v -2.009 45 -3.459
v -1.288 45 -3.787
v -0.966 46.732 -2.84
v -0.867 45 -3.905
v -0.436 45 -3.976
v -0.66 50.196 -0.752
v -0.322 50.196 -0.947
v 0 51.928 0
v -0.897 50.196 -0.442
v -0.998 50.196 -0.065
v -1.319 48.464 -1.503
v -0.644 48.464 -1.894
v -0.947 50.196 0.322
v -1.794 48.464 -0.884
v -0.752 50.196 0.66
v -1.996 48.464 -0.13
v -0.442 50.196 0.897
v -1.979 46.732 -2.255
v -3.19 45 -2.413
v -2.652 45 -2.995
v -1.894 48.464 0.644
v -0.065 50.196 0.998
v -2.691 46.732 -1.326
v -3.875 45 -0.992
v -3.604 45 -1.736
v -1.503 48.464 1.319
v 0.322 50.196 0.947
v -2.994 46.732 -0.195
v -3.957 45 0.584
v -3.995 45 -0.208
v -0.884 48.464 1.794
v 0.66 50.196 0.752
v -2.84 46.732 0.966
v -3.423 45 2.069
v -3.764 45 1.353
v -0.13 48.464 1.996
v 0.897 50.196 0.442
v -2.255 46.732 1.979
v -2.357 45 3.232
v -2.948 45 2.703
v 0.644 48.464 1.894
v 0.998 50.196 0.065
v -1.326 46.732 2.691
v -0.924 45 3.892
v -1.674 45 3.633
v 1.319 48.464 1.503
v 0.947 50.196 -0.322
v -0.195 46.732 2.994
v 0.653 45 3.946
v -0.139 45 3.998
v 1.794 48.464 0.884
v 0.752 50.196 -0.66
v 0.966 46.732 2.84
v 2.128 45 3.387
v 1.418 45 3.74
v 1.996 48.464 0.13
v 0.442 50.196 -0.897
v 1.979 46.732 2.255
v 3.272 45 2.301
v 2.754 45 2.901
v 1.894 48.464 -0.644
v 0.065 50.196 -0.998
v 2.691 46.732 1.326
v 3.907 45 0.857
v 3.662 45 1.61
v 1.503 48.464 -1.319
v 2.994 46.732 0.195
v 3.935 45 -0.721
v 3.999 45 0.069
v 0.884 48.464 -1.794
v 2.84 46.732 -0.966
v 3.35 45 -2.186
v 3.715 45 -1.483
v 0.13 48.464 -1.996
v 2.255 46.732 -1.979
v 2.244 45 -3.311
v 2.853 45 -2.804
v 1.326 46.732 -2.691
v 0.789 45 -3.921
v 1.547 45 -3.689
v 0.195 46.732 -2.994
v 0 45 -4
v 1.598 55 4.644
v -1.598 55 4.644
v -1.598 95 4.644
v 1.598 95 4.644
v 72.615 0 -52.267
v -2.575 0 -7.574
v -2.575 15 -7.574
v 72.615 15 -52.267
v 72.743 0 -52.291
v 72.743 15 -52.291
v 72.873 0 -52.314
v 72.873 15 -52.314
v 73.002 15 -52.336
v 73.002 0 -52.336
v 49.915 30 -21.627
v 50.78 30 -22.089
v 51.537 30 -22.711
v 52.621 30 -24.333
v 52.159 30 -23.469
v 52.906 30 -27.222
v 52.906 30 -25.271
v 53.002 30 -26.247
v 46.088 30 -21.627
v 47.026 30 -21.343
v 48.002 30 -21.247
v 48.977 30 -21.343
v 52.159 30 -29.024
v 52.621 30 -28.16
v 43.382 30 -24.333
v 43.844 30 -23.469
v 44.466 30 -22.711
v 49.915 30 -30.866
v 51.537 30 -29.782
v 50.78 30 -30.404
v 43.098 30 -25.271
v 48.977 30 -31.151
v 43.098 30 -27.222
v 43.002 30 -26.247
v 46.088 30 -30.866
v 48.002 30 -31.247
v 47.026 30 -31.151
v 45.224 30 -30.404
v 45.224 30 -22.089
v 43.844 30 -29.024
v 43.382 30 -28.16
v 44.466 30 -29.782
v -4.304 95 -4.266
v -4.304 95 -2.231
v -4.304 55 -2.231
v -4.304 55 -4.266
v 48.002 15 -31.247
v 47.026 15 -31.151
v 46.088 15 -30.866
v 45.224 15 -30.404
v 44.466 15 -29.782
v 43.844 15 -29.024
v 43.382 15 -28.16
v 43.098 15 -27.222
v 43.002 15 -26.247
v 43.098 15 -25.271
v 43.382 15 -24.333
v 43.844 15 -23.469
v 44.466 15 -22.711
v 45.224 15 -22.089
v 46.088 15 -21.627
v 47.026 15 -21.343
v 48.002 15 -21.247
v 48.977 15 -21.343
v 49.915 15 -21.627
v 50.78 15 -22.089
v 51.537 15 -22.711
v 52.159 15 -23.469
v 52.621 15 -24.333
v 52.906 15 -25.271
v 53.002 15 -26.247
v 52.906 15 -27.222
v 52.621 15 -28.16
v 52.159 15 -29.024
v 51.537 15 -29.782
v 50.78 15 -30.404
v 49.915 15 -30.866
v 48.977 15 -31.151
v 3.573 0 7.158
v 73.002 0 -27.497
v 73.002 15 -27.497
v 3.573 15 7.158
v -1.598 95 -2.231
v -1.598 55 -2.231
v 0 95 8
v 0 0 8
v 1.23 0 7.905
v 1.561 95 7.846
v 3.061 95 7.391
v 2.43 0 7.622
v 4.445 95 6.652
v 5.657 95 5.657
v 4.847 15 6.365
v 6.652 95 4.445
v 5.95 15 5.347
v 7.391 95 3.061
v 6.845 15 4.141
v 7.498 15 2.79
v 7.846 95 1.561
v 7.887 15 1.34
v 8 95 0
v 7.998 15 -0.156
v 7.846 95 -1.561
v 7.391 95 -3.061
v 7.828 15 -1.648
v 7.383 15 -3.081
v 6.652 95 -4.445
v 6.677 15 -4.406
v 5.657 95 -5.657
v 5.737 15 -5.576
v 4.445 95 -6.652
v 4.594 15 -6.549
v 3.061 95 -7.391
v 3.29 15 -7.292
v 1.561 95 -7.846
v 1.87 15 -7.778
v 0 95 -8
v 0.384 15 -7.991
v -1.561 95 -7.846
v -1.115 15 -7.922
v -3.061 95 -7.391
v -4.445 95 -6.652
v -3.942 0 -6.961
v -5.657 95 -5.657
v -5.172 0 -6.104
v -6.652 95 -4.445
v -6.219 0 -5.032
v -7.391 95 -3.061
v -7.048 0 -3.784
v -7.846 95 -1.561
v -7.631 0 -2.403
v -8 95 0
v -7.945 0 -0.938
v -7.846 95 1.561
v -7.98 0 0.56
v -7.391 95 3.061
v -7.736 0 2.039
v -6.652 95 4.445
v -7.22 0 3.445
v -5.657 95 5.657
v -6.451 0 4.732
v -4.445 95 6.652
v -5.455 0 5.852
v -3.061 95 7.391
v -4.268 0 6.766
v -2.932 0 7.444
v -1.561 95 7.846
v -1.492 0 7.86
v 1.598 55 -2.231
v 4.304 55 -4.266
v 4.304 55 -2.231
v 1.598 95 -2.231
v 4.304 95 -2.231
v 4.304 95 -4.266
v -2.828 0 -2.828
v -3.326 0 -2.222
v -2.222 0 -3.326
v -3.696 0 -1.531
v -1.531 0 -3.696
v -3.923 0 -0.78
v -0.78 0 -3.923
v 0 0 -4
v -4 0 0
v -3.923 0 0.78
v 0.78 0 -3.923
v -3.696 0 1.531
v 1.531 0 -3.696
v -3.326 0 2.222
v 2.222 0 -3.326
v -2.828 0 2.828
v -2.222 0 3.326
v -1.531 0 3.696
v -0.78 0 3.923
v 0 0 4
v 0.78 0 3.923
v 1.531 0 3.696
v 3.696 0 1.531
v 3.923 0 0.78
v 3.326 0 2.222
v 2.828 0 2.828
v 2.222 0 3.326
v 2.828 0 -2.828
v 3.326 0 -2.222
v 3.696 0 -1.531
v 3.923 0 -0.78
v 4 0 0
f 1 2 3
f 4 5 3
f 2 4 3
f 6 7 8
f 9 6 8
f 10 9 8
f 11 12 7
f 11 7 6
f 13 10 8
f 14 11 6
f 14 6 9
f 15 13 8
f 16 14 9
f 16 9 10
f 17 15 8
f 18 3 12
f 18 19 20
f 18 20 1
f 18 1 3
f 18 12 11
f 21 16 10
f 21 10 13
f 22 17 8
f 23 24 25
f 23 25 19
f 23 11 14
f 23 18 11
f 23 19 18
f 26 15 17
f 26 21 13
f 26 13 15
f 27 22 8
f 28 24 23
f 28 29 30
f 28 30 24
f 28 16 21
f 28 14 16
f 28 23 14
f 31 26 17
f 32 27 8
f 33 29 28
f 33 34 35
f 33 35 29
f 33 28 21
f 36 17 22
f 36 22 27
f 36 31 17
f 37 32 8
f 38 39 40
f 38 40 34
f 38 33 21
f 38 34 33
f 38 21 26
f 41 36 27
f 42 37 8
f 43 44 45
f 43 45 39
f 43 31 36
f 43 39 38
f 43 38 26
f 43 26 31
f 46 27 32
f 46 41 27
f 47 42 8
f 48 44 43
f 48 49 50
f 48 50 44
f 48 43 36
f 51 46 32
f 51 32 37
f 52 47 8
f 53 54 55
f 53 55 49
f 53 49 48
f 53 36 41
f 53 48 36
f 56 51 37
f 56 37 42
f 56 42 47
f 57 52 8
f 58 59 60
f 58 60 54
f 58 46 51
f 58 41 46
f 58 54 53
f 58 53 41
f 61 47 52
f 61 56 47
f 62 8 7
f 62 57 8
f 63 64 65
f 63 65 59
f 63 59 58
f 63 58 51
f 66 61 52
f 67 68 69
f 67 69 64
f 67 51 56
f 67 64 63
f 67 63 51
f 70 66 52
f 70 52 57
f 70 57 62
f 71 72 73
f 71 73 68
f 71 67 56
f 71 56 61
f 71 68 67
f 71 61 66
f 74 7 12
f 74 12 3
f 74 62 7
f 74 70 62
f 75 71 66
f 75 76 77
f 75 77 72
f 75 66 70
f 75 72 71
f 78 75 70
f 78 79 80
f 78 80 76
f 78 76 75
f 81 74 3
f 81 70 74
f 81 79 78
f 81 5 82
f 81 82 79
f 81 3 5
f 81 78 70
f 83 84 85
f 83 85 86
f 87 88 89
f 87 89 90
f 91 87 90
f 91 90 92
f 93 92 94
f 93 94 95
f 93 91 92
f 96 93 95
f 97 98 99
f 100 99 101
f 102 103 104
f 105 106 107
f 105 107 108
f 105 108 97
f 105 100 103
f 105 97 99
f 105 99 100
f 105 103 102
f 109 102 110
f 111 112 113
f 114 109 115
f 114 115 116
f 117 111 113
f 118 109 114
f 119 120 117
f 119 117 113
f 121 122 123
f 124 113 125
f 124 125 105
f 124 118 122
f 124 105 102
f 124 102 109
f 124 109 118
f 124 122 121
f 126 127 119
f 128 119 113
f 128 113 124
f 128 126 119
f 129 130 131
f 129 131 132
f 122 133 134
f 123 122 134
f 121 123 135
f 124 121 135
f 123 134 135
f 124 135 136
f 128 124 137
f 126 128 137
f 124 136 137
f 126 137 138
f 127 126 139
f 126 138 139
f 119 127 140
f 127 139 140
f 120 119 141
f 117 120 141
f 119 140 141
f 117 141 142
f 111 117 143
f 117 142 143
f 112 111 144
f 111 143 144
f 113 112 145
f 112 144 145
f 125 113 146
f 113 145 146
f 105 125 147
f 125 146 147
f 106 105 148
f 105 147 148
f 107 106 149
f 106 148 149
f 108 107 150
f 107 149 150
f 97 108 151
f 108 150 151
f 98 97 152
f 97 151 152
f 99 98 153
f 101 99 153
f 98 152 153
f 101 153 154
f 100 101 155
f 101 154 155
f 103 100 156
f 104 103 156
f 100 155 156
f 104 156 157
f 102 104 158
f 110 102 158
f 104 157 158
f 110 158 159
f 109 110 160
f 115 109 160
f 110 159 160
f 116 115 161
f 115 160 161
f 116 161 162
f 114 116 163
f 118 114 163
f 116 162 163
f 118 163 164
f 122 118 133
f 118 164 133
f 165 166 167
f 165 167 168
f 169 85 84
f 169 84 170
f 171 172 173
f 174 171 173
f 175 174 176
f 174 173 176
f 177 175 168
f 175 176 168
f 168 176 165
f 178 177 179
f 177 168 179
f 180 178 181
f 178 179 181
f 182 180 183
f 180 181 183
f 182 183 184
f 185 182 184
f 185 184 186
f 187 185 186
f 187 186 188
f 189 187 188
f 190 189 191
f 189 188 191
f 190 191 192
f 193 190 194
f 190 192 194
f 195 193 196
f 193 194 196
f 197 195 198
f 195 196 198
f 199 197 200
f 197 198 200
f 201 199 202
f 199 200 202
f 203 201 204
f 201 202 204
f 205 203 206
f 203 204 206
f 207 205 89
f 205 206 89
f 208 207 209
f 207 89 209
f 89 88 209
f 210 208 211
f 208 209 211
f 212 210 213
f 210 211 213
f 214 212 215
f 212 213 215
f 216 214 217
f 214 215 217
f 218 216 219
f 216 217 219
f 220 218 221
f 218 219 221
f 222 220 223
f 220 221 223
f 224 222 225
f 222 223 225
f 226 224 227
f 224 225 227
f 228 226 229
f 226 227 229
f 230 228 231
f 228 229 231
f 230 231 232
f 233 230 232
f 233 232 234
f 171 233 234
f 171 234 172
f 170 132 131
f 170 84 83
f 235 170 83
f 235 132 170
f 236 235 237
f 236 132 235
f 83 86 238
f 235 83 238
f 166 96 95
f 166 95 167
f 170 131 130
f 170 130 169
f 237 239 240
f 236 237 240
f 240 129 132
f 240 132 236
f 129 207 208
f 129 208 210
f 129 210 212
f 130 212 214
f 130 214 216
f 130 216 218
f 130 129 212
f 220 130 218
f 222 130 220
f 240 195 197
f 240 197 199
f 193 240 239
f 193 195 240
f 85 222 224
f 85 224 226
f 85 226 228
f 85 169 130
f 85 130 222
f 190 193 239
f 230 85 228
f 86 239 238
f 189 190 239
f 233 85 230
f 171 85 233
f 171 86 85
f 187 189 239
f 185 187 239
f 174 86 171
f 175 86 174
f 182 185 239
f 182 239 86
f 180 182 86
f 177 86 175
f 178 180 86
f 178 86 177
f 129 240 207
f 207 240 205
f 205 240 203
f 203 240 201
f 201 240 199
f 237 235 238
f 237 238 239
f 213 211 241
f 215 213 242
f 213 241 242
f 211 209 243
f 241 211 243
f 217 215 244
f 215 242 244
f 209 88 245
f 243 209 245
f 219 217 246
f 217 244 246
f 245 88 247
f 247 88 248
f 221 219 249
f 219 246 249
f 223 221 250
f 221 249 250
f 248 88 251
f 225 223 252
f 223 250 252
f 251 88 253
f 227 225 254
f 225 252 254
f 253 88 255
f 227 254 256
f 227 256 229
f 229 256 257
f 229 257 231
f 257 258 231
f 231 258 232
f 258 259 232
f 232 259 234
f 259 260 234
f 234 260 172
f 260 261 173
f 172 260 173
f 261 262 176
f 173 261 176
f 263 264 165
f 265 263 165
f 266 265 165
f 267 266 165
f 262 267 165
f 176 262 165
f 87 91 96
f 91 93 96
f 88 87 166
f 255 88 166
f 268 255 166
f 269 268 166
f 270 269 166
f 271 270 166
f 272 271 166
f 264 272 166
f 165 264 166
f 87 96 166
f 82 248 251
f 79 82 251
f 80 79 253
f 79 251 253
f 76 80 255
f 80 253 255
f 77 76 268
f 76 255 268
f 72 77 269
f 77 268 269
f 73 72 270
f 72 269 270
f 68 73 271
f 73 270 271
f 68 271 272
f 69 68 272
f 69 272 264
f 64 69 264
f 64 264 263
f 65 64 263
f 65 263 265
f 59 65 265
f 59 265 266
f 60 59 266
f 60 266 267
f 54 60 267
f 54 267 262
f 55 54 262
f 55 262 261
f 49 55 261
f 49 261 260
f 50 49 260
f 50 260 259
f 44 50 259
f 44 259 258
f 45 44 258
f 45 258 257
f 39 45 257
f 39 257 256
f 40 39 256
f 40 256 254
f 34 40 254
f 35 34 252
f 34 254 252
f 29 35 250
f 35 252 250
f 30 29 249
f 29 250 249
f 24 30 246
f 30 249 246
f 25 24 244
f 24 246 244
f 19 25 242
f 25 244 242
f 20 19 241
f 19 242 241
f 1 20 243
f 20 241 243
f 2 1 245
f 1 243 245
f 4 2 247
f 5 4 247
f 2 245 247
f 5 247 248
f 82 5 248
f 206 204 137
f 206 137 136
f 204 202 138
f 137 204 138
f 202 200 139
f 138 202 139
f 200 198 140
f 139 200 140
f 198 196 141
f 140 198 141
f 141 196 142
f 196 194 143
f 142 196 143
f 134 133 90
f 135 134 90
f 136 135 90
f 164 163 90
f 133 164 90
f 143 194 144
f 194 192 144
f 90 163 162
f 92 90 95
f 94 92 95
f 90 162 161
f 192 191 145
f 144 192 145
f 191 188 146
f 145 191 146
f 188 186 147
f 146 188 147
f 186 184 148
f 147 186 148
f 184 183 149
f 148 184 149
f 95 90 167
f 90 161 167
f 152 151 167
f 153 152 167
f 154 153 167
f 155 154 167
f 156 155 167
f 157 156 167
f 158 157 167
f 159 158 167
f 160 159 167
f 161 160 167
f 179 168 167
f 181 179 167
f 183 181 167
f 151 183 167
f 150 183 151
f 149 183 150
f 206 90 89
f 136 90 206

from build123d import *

# Parameters (mm, degrees)
SKETCH1_R           = 8
BOSS_EXTRUDE1_DEPTH = 95
SKETCH2_R           = 4
CUT_EXTRUDE1_DEPTH  = 45
SKETCH3_W           = 8.60885167
SKETCH3_H           = 2.035138461
SKETCH3_W_2         = 3.196177608
SKETCH3_H_2         = 6.875388446
CUT_EXTRUDE2_DEPTH  = 40
BOSS_EXTRUDE2_DEPTH = 15
SKETCH5_R           = 5
BOSS_EXTRUDE3_DEPTH = 15


with BuildPart() as part:
    # Sketch1 → Boss-Extrude1 (new body)
    with BuildSketch(Plane(origin=(0, 0, 0), x_dir=(1, 0, 0), z_dir=(0, 1, 0))):
        with Locations(Location((0, 0, 0), (0, 0, 270))):
            Circle(SKETCH1_R)
    extrude(amount=BOSS_EXTRUDE1_DEPTH)

    # Sketch2 → Cut-Extrude1 (cut)
    with BuildSketch(Plane.XZ):
        with Locations(Location((0, 0, 0), (0, 0, 270))):
            Circle(SKETCH2_R)
    extrude(amount=-CUT_EXTRUDE1_DEPTH, mode=Mode.SUBTRACT)

    # Sketch3 → Cut-Extrude2 (cut)
    with BuildSketch(Plane(origin=(0, 95, 0), x_dir=(1, 0, 0), z_dir=(0, 1, 0))):
        with Locations((0, 3.24887213)):
            Rectangle(SKETCH3_W, SKETCH3_H)
        with Locations((0, -1.206391324)):
            Rectangle(SKETCH3_W_2, SKETCH3_H_2)
    extrude(amount=-CUT_EXTRUDE2_DEPTH, mode=Mode.SUBTRACT)

    # Sketch4 → Boss-Extrude2 (add)
    with BuildSketch(Plane.XZ):
        with BuildLine():
            ThreePointArc((72.61474538, -52.266719107), (72.807969556, -52.302734502), (73.001736138, -52.33570725))
            Line((73.001736138, -52.33570725), (73.001736138, -27.496744571))
            Line((73.001736138, -27.496744571), (3.57279106, 7.157874268))
            ThreePointArc((3.57279106, 7.157874268), (7.382913261, -3.081004996), (-2.575137965, -7.574210484))
            Line((-2.575137965, -7.574210484), (72.61474538, -52.266719107))
        make_face()
    extrude(amount=-BOSS_EXTRUDE2_DEPTH)

    # Sketch5 → Boss-Extrude3 (add)
    with BuildSketch(Plane(origin=(0, 15, 0), x_dir=(1, 0, 0), z_dir=(0, 1, 0))):
        with Locations(Location((48.001736138, 26.246610631, 0), (0, 0, 90))):
            Circle(SKETCH5_R)
    extrude(amount=BOSS_EXTRUDE3_DEPTH)

    # Sketch9 → Cut-Revolve2 (revolve, cut)
    with BuildSketch(Plane(origin=(0, 0, 0), x_dir=(0.6901743919423456, 0, -0.7236430810192366), z_dir=(-0.7236430810192366, 0, -0.6901743919423456)), mode=Mode.PRIVATE) as cut_revolve2_sk:
        Polygon((-4, -45), (0, -45), (0, -51.92820323), align=None)
    revolve(cut_revolve2_sk.sketch.rotate(Axis((0, 45, 0), (0, 1, 0)), 242.42131363), axis=Axis((0, 45, 0), (0, 1, 0)), mode=Mode.SUBTRACT)


solid = part.part
